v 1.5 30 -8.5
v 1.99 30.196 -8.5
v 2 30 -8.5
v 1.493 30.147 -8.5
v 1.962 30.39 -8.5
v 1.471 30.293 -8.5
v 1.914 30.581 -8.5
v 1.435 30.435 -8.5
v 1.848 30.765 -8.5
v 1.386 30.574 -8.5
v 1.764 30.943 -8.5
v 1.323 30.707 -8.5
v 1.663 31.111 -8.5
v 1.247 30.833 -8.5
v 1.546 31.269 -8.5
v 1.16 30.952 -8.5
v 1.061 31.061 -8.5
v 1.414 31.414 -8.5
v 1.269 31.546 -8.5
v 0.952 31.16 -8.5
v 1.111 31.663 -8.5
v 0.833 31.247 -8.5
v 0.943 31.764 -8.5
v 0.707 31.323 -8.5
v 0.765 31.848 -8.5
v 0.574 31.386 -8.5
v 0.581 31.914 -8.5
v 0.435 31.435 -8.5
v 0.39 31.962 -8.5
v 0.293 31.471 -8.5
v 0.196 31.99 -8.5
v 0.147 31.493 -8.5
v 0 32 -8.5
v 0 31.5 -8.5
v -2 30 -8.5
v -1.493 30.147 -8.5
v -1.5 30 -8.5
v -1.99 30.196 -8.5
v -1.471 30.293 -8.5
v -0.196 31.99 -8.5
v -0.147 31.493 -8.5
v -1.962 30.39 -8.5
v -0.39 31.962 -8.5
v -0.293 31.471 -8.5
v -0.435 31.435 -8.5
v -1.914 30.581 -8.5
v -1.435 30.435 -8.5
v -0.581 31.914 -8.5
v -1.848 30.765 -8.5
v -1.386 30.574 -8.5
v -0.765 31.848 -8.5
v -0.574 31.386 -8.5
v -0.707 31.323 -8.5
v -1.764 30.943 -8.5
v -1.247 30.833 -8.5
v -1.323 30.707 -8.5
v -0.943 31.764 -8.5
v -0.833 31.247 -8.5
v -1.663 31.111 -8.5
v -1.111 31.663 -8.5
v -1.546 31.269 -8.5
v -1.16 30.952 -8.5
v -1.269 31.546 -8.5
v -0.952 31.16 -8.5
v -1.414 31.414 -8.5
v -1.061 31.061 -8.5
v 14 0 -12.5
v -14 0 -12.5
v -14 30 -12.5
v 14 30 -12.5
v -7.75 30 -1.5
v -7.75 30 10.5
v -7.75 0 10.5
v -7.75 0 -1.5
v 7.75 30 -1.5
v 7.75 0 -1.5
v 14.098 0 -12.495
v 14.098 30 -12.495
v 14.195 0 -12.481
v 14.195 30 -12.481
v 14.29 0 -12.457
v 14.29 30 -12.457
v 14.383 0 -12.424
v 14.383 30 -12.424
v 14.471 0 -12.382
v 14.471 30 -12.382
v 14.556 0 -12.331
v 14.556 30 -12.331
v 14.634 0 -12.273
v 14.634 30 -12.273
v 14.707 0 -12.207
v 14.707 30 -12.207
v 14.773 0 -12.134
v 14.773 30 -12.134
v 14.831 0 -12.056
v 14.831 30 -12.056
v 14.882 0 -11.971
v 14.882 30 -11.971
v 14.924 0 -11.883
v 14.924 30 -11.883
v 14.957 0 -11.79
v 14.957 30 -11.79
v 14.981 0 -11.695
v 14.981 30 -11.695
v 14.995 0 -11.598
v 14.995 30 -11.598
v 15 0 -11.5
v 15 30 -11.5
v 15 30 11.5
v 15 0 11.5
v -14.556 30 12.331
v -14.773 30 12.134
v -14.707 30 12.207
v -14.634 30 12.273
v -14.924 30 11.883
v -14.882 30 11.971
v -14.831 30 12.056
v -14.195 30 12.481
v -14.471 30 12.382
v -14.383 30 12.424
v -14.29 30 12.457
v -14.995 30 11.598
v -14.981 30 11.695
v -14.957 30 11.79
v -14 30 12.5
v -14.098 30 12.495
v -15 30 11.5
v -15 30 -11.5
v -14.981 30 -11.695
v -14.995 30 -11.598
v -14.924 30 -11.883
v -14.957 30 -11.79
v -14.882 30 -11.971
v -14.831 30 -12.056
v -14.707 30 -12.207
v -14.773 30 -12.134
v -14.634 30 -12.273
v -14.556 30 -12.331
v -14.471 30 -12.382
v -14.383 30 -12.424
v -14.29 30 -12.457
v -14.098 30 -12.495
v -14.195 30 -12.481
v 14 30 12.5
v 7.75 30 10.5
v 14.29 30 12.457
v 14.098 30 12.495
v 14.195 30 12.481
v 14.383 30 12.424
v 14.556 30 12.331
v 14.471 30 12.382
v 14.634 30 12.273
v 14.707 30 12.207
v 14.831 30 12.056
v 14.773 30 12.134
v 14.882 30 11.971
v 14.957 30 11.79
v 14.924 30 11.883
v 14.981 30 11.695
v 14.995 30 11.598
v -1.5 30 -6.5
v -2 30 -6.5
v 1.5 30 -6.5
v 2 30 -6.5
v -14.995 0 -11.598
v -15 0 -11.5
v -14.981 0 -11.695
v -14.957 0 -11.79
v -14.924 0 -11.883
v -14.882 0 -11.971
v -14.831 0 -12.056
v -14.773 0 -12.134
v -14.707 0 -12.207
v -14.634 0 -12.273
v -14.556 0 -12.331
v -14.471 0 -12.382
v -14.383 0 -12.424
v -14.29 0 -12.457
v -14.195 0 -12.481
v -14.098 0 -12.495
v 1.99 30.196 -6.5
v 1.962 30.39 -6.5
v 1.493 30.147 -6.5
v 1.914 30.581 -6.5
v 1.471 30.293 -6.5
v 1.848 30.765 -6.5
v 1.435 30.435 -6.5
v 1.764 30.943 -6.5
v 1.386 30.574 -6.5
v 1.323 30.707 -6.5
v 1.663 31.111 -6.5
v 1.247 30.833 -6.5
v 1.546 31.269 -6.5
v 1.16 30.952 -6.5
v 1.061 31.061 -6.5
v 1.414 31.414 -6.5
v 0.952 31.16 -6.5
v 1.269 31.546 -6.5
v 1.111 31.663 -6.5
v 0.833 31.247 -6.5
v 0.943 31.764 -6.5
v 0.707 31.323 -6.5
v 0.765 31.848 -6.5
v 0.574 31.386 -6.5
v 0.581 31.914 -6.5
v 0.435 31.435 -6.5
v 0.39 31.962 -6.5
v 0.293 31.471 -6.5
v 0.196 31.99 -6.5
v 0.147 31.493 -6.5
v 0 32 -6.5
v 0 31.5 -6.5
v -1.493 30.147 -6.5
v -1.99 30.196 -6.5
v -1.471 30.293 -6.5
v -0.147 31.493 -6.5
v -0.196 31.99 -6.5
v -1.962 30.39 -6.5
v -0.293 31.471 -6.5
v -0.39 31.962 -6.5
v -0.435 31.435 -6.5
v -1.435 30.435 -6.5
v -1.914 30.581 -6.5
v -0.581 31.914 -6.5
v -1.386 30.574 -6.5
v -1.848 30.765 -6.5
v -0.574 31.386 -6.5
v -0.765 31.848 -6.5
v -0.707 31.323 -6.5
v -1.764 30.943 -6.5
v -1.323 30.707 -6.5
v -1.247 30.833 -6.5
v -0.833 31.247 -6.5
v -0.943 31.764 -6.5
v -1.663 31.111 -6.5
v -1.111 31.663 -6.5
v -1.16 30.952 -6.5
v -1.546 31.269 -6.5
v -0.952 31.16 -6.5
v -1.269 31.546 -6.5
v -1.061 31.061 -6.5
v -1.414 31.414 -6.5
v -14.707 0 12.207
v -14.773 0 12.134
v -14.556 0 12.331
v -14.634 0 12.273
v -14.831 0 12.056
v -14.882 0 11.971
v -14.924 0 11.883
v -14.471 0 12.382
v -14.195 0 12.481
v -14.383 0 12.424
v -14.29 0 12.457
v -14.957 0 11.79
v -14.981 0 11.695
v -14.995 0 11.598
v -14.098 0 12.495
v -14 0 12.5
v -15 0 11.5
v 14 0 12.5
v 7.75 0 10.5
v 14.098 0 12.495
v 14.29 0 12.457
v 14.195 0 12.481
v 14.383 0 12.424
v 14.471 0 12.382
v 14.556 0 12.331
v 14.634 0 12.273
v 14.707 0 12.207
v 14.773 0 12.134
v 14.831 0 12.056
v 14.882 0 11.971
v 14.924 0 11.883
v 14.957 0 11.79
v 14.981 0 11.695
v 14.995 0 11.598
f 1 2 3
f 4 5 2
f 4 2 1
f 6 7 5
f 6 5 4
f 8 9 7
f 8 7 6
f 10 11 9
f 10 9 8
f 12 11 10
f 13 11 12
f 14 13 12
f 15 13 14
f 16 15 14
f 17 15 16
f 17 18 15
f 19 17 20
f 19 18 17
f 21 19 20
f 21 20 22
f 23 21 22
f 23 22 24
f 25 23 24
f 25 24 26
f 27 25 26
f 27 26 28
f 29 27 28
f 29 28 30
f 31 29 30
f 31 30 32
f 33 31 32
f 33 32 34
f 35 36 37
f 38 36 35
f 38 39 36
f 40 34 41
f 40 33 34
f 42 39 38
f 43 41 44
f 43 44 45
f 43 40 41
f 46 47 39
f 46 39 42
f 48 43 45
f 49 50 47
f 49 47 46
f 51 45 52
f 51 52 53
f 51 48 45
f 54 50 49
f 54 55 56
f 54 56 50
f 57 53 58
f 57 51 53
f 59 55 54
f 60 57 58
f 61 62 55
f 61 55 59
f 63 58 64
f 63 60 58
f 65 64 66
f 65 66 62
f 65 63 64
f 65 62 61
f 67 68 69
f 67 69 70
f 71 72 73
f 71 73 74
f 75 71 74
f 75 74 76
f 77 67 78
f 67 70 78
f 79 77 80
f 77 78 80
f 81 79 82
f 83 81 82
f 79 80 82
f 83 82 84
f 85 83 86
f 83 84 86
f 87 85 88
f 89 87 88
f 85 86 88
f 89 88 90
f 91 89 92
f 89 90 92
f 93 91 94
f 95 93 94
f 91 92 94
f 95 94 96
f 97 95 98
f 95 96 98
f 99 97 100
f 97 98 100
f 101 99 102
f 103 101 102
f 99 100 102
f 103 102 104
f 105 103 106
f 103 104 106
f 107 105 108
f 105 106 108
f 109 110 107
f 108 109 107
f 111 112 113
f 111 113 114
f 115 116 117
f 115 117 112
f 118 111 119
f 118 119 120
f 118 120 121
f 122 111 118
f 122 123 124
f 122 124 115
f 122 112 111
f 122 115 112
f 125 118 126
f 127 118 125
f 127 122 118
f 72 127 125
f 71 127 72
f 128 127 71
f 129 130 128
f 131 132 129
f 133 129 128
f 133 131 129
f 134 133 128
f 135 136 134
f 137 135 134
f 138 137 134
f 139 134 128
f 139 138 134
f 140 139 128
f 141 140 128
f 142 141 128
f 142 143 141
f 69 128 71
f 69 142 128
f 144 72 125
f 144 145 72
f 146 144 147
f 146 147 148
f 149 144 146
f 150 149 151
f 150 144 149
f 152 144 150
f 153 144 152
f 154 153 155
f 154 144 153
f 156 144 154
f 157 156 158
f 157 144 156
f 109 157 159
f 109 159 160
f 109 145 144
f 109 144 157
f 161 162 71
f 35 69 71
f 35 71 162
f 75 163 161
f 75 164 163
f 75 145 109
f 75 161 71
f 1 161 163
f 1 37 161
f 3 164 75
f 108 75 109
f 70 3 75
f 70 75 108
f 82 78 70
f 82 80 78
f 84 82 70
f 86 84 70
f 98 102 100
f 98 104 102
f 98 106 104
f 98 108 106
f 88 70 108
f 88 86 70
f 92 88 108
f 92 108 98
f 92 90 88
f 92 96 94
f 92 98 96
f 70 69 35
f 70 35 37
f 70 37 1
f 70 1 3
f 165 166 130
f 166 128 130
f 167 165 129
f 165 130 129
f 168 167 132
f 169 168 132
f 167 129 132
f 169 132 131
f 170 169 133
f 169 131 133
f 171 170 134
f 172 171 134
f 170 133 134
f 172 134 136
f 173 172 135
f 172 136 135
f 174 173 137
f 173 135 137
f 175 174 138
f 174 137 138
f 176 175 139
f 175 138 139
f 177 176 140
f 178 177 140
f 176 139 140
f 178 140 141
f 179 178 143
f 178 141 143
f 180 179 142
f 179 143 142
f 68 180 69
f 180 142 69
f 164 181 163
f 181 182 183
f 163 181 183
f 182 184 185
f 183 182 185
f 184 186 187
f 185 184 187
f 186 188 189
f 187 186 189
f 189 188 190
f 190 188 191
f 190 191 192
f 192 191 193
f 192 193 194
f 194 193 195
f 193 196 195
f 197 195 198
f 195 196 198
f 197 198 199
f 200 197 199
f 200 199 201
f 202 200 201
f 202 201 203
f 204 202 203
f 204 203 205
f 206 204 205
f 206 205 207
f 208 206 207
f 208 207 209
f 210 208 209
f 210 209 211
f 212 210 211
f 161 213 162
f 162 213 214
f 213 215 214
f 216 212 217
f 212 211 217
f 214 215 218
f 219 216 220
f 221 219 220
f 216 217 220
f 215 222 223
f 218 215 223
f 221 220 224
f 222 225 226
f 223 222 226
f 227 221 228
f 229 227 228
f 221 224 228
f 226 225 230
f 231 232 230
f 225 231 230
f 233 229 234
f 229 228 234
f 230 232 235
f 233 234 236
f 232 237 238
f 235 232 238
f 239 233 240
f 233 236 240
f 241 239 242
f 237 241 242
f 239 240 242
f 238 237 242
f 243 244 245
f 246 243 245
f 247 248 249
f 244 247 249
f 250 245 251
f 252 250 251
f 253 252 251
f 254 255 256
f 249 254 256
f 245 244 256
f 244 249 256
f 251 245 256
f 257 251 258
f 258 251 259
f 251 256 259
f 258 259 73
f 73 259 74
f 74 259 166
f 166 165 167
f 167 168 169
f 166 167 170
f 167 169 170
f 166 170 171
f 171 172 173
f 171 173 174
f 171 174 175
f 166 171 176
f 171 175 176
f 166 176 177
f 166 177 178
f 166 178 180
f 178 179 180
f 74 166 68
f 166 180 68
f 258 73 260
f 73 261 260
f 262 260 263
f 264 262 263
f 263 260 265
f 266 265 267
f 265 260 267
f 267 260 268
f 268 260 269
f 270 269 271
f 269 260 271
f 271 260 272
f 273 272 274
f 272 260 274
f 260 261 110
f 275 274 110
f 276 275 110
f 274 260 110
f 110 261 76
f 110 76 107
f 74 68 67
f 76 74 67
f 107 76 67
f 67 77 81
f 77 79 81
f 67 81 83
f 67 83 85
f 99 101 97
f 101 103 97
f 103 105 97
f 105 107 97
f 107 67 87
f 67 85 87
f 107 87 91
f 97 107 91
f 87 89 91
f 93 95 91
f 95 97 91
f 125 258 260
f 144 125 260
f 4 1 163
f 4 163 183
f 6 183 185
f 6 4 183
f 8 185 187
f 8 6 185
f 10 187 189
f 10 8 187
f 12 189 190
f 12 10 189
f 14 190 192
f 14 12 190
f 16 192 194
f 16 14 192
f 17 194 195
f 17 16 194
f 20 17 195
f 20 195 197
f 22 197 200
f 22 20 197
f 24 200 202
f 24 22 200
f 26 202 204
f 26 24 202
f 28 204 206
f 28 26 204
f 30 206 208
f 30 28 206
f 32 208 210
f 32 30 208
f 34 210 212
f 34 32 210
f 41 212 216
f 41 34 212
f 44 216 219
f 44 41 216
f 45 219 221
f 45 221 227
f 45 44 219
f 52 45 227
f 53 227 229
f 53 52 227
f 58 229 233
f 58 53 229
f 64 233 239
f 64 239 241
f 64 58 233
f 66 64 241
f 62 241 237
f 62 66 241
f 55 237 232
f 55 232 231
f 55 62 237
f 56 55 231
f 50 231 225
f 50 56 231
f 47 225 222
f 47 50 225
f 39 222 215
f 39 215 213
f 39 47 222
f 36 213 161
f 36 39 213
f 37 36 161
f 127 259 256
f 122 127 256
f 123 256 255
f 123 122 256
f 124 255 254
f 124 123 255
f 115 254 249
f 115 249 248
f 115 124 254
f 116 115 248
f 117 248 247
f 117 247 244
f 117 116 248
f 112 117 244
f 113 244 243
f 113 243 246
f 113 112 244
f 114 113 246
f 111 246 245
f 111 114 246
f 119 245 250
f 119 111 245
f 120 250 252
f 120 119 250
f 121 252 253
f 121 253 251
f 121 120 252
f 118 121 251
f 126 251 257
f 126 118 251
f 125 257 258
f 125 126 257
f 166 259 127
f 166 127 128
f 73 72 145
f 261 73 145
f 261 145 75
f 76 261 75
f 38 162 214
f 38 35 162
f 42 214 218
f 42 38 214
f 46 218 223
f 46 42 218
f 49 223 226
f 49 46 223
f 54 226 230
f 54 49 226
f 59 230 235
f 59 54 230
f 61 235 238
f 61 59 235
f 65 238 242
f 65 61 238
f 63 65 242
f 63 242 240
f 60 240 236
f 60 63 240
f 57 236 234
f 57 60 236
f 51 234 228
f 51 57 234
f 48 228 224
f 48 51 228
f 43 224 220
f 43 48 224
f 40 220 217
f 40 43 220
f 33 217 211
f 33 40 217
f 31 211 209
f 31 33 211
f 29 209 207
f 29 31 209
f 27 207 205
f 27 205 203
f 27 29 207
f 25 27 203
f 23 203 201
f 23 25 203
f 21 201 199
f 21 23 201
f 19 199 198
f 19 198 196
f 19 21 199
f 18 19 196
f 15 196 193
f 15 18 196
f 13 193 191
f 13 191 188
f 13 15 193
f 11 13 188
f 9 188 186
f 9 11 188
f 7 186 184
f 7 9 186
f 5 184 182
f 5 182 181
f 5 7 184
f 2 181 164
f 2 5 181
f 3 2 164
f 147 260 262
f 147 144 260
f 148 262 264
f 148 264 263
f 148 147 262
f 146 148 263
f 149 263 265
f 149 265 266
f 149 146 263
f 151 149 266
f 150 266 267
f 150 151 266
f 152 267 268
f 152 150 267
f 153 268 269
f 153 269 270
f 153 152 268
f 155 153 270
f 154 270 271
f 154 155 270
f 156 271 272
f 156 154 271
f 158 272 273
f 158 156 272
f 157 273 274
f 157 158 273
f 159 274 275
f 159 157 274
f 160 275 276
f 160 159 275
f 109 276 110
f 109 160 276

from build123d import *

# Parameters (mm, degrees)
SKETCH1_W           = 30
SKETCH1_H           = 25
BOSS_EXTRUDE1_DEPTH = 30
SKETCH2_W           = 15.5
SKETCH2_H           = 12
CUT_EXTRUDE1_DEPTH  = 30
FILLET1_R           = 1
BOSS_EXTRUDE2_DEPTH = 1


with BuildPart() as part:
    # Sketch1 → Boss-Extrude1 (new body)
    with BuildSketch(Plane(origin=(0, 0, 0), x_dir=(1, 0, 0), z_dir=(0, 1, 0))):
        Rectangle(SKETCH1_W, SKETCH1_H)
    extrude(amount=BOSS_EXTRUDE1_DEPTH)

    # Sketch2 → Cut-Extrude1 (cut)
    with BuildSketch(Plane(origin=(0, 30, 0), x_dir=(1, 0, 0), z_dir=(0, 1, 0))):
        with Locations((0, -4.5)):
            Rectangle(SKETCH2_W, SKETCH2_H)
    extrude(amount=-CUT_EXTRUDE1_DEPTH, mode=Mode.SUBTRACT)

    # Fillet1
    fillet1_edges = [part.edges().sort_by_distance(p)[0] for p in [
        (15, 15, 12.5),
        (-15, 15, 12.5),
        (-15, 15, -12.5),
        (15, 15, -12.5),
    ]]
    fillet(fillet1_edges, radius=FILLET1_R)

    # Sketch3 → Boss-Extrude2 (add, symmetric)
    with BuildSketch(Plane(origin=(0, 0, -7.5), x_dir=(-1, 0, 0), z_dir=(0, 0, -1))):
        with BuildLine():
            ThreePointArc((2, 30), (0, 32), (-2, 30))
            Line((-2, 30), (-1.5, 30))
            ThreePointArc((-1.5, 30), (0, 31.5), (1.5, 30))
            Line((1.5, 30), (2, 30))
        make_face()
    extrude(amount=BOSS_EXTRUDE2_DEPTH, both=True)


solid = part.part
